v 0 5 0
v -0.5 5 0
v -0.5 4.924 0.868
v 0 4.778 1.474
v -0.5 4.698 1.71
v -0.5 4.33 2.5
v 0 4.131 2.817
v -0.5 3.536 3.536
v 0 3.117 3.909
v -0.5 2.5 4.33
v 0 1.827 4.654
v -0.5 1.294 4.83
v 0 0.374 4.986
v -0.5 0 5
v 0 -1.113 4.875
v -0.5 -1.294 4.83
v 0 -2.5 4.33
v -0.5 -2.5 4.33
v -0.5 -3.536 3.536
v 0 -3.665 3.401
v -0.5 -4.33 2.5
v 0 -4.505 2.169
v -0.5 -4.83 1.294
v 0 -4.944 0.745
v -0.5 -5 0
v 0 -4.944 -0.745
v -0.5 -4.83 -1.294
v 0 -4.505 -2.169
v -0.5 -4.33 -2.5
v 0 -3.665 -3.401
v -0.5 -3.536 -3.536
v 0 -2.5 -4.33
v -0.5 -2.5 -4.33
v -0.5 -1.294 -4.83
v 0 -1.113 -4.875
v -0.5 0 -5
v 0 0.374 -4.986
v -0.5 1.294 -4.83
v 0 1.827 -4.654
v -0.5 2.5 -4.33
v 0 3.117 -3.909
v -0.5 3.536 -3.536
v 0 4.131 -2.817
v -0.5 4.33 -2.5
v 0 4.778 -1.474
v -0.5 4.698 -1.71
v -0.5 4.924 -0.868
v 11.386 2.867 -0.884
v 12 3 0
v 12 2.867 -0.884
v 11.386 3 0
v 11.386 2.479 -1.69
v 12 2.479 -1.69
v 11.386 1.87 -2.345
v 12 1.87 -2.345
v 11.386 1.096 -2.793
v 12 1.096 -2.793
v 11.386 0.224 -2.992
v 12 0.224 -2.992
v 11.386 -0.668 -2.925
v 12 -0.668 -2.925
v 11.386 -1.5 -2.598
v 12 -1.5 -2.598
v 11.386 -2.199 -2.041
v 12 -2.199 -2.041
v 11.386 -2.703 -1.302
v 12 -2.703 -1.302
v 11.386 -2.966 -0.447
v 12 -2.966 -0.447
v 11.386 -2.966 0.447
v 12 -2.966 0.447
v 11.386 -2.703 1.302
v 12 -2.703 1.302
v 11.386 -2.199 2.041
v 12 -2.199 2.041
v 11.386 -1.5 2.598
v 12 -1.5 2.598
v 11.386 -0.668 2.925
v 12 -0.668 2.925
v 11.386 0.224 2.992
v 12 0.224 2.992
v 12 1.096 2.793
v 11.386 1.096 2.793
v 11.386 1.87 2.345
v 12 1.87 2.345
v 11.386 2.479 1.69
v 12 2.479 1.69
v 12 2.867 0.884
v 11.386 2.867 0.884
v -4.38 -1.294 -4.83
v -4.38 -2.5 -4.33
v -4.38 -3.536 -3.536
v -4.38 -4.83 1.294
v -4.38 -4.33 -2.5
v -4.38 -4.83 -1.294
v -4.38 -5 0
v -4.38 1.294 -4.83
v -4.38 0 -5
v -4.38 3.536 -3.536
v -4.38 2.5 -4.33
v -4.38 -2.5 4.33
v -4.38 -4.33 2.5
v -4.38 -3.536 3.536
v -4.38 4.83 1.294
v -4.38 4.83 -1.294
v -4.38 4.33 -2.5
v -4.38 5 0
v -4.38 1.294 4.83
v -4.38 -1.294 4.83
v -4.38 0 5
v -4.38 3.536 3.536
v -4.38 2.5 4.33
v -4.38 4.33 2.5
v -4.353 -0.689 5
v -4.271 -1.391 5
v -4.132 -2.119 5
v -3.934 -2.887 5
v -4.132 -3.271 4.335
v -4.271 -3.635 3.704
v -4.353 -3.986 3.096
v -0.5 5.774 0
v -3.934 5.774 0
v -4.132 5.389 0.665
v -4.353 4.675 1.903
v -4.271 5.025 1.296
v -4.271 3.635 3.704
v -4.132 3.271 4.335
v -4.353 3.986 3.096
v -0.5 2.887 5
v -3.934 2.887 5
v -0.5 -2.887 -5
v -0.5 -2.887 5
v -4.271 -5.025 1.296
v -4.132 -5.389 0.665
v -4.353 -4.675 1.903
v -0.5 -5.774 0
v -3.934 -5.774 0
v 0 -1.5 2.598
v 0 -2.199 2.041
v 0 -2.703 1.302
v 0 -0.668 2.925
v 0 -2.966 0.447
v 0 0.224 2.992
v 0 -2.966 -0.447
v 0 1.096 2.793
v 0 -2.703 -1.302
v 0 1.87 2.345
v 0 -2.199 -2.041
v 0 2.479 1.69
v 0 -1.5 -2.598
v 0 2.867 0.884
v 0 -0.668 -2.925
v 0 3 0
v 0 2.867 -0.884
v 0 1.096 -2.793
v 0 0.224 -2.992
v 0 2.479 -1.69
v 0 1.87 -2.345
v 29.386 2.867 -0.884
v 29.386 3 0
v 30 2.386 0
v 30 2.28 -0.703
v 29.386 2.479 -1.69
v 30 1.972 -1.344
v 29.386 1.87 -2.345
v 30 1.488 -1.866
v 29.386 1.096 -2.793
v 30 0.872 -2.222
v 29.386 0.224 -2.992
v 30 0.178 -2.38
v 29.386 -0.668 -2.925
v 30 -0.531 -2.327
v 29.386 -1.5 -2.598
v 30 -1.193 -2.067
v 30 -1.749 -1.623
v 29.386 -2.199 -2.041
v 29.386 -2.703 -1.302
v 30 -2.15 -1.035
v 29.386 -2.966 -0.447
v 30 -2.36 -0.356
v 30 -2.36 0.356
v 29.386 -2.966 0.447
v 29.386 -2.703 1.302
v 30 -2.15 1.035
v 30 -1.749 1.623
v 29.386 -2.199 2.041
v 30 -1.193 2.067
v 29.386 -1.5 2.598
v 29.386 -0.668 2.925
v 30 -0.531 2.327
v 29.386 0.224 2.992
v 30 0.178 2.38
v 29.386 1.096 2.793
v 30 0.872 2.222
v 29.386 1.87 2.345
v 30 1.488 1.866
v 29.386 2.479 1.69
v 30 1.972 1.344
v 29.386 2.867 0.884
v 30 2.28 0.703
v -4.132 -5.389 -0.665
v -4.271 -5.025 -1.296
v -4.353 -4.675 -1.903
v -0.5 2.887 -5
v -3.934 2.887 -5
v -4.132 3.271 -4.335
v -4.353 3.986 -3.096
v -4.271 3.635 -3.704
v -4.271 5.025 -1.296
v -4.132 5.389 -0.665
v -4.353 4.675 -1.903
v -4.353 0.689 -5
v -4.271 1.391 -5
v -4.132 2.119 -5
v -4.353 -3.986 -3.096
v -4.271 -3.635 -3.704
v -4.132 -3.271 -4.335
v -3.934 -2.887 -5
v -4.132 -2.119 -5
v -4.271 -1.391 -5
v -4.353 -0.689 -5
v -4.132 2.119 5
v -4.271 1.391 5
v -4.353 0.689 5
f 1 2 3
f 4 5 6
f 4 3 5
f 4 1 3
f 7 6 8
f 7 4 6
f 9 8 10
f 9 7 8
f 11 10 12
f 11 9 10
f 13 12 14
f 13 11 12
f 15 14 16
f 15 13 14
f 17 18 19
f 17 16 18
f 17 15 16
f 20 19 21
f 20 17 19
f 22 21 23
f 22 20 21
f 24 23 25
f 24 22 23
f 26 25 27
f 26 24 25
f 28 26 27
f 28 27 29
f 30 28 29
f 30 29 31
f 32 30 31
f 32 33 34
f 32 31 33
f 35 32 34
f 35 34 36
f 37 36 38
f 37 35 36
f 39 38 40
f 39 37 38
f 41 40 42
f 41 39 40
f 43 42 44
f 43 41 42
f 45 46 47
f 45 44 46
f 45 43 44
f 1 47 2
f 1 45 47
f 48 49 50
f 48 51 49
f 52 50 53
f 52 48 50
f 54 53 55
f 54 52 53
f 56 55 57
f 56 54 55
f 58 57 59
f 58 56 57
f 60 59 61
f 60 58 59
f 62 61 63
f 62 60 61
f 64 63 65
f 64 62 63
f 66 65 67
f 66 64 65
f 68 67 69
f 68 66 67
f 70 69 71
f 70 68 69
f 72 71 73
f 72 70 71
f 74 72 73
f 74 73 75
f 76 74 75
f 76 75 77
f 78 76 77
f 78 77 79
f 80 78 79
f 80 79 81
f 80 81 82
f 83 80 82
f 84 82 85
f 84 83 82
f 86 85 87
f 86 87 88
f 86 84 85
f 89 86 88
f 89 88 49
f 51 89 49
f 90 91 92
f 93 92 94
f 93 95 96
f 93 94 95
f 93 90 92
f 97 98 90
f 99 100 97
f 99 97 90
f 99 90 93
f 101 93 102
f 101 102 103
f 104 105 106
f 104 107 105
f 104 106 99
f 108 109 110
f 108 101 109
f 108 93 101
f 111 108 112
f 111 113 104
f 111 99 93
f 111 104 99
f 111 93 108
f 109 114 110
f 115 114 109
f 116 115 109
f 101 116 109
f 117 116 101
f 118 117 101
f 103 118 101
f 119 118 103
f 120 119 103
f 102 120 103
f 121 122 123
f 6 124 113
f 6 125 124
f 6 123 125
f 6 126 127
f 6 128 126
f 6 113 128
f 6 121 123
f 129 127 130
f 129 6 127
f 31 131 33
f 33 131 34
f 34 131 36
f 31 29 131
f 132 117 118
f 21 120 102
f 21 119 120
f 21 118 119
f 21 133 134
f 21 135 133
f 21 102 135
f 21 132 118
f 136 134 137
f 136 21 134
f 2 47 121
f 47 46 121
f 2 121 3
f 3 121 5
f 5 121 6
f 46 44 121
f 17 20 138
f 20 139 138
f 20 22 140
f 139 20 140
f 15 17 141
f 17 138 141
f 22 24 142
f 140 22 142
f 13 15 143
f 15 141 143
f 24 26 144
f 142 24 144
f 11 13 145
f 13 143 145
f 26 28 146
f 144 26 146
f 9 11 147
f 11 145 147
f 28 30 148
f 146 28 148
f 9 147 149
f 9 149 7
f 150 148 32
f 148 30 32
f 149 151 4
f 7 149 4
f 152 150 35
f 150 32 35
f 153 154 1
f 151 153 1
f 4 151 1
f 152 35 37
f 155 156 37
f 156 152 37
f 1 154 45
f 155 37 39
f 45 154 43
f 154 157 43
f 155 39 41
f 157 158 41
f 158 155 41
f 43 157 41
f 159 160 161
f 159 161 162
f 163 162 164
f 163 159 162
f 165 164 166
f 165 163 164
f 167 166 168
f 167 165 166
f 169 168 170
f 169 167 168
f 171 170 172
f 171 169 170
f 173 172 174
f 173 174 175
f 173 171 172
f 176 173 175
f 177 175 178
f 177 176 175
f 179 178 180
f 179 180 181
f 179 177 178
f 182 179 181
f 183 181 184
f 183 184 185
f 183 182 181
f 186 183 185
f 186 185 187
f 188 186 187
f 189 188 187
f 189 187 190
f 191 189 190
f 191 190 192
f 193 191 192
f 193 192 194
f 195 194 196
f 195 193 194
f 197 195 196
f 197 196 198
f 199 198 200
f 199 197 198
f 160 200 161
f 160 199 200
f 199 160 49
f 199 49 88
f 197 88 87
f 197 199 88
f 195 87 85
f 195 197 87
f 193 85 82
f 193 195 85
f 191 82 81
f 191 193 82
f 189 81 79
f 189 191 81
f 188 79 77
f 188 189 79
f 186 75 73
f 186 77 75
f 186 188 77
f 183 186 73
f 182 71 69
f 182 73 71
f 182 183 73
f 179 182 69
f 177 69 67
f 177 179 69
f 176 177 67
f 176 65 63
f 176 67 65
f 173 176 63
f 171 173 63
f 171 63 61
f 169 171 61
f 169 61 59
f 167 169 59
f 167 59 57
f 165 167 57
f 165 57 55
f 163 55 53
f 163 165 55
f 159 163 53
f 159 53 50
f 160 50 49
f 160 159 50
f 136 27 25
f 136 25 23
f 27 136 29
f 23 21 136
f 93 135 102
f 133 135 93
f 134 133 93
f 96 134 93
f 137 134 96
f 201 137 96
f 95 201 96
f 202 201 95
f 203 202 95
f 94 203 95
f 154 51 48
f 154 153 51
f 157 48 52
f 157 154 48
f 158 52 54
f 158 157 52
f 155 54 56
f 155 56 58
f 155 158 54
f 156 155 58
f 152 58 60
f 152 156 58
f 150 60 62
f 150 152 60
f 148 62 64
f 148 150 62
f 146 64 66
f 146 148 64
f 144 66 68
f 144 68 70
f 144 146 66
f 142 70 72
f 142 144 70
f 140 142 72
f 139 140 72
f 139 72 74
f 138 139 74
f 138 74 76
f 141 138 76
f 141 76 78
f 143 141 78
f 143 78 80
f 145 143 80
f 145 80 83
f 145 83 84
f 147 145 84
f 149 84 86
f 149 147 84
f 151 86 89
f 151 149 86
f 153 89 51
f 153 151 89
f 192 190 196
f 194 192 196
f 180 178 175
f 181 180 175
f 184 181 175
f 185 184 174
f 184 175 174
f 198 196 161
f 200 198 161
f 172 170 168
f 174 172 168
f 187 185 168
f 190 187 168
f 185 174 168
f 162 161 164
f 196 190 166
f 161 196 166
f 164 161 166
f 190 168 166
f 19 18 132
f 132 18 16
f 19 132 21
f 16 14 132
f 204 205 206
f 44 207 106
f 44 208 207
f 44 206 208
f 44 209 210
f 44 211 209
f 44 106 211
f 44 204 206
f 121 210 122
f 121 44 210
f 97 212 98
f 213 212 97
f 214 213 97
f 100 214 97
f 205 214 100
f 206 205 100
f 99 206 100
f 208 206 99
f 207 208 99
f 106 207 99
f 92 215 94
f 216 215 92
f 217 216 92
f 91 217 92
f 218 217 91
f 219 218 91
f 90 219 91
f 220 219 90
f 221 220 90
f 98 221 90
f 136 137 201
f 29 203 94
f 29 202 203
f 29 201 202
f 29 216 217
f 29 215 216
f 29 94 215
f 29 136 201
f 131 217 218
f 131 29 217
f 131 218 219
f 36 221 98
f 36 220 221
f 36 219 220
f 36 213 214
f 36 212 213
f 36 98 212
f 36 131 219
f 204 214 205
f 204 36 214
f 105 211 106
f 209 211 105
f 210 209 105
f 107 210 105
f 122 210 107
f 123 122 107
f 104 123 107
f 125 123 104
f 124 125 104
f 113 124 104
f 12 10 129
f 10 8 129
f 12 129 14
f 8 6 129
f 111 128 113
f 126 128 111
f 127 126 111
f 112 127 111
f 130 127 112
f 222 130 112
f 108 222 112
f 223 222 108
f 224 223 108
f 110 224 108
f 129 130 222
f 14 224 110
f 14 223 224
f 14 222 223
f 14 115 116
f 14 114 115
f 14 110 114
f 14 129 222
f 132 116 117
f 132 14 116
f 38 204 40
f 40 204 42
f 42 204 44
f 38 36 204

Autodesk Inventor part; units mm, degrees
ref_plane "YZ Plane" through (0, 0, 0) normal (1, 0, 0) x (0, 1, 0)
ref_plane "XZ Plane" through (0, 0, 0) normal (0, 1, 0) x (-1, 0, 0)
sketch "Sketch1" plane through (0, 0, 0) normal (0, 0, 1) x (1, 0, 0)
  line L0 (0, 5) -> (0, 3)
  line L1 (12, 3) -> (30, 3)
  line L2 (30, 3) -> (30, 0)
  line L3 (30, 0) -> (-0.5001, 0)
  line L4 (-6.6001, 0) -> (36.1, 0) projected
  line L5 (-0.5001, 0) -> (-0.5001, 5)
  line L6 (-0.5001, 5) -> (0, 5)
  line L7 (12, 3) -> (11.3865, 3)
  line L8 (11.3865, 3) -> (0, 3)
  line L9 (0, -1) -> (0, 6) projected
  dimension "d0" = 30
  dimension "d1" = 18
  dimension "d2" = 6
  dimension "d9" = 0.5001
  dimension "d10" = 10
  dimension "d13" = 0.6136
  dimension "d14" = 6
revolve "Body" add sketch "Sketch1" angle 360 about axis through (30, 0, 0) along (-1, 0, 0)
sketch "Sketch2" plane through (-0.5001, 0, 0) normal (-1, 0, 0) x (0, 0, 1)
  line L0 (0, 5.7735) -> (5, 2.8868)
  line L1 (5, 2.8868) -> (5, -2.8868)
  line L2 (5, -2.8868) -> (0, -5.7735)
  line L3 (0, -5.7735) -> (-5, -2.8868)
  line L4 (-5, -2.8868) -> (-5, 2.8868)
  line L5 (-5, 2.8868) -> (0, 5.7735)
  point P0 (0, 0)
  point P1 (0, 0)
  dimension "d11" = 10
extrude "Head" add sketch "Sketch2" along normal blind 3.88
sketch "Sketch4" plane through (0, 0, 0) normal (0, 0, 1) x (1, 0, 0)
  line L0 (-4.3801, 5) -> (-4.3801, 5.7735)
  line L1 (-4.3801, 5.7735) -> (-3.9335, 5.7735)
  line L2 (-3.9335, 5.7735) -> (-4.3801, 5)
  line L3 (-5.1561, 0) -> (0.2759, 0) projected
  line L4 (-0.5001, 5.7735) -> (-4.3801, 5.7735) projected
  line L5 (-4.3801, 2.8868) -> (-4.3801, 5.7735) projected
  dimension "d5" = 30
  dimension "d19" = 10
revolve "Chamfer1" cut sketch "Sketch4" angle 360 about axis through (-10, 0, 0) along (1, 0, 0)
thread "Thread" size "M6x1" class "6g" standard "ISO Metric profile" length 18
chamfer "Chamfer2" distance 0.6135 distance2 0.6136 1 edges at (30, -3, 0) measured on face at (30, 1.1079, -0.4377)
ref_plane "Work Plane1" through (1.525, 0, 0) normal (0, 0, 1) x (1, 0, 0)
equation "\"d11\" = SW"
equation "\"d3\" = KOH - SD"
equation "\"d15\" = GEL"
equation "\"d6\" = -0.5 * SPD + 0.5 * GD"
equation "\"d0\" = NLG"
equation "\"d1\" = GEL"
equation "\"d2\" = GD"
equation "\"d10\" = SD2"
equation "\"d14\" = BDM"
equation "\"d5\" = ANG1"
equation "\"d19\" = SW0"
equation "\"NLG\" = 30"
equation "\"GD\" = NND"
equation "\"BDM\" = NND"
equation "\"KOH\" = 4.38"
equation "\"GEL\" = 18"
equation "\"SW\" = 10"
equation "\"SW0\" = SW"
equation "\"SPD\" = NND - 1.2269 * PTC"
equation "\"SD2\" = SW"
equation "\"SD\" = 0.5"
equation "\"ANG1\" = 30deg"
equation "\"GAL\" = 0.61345 * PTC"
equation "\"GUL\" = 0.61345 * PTC"
equation "\"RR\" = 0.25"
equation "\"WFT\" = SD"
equation "\"GD1\" = THREADDIA - 1.2269 * PTC"
equation "\"THREADDIA\" = 6"
equation "\"TOA\" = 30deg"
equation "\"FAWI\" = 45deg"
equation "\"PTC\" = 1"
equation "\"NND\" = 6"
equation "\"E0\" = 1.155 * SW"
properties part number "AS 1111 - M6 x 30" material "Steel, Mild"
